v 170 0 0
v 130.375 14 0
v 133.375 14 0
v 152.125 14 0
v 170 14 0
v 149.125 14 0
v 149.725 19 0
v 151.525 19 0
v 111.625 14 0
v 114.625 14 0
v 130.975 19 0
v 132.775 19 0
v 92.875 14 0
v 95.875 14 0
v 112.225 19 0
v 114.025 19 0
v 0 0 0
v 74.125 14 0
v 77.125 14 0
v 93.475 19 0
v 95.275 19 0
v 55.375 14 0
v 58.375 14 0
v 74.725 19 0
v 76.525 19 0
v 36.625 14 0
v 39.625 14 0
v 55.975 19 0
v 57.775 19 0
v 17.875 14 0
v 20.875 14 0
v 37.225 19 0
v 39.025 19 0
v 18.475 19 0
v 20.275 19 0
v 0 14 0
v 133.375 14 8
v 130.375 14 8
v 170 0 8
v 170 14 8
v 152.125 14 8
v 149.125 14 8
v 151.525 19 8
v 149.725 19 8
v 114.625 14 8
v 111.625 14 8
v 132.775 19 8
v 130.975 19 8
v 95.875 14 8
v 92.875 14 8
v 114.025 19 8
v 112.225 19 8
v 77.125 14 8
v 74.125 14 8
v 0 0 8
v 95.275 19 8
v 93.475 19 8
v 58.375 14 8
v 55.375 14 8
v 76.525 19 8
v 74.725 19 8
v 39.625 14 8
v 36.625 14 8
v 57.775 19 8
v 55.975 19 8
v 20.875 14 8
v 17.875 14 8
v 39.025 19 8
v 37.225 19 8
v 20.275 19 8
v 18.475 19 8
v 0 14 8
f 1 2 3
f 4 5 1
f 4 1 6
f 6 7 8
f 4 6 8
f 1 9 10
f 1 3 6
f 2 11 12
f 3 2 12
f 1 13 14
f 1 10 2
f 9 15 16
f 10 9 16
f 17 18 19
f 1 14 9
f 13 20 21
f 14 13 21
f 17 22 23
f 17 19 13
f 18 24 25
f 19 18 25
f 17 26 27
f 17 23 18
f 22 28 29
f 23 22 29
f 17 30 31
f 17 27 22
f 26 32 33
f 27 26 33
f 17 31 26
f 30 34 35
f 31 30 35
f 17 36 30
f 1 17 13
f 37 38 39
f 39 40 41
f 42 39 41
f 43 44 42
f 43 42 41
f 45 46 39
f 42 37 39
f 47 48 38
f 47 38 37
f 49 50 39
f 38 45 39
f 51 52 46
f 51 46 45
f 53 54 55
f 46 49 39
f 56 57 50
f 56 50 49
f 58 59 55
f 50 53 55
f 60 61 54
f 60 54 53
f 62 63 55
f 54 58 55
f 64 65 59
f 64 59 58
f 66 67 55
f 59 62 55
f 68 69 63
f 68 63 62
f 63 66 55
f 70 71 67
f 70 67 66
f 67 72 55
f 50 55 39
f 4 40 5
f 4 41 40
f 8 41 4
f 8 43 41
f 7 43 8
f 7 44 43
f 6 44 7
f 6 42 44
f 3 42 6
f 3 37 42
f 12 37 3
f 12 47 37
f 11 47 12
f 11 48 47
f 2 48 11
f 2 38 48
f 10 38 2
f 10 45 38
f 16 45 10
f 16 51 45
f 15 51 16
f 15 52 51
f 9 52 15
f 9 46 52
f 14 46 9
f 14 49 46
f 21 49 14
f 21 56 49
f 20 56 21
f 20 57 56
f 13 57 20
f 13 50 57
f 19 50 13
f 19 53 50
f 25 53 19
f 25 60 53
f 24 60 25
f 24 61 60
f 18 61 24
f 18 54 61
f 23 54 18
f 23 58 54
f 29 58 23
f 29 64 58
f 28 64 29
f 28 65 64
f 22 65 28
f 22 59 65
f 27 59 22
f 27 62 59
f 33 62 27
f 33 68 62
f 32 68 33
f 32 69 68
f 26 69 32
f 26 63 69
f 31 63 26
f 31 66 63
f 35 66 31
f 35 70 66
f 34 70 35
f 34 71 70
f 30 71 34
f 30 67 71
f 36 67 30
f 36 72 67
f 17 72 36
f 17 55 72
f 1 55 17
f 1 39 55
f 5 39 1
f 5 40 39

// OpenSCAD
$fn = 32;

// ----------------------------------------------------------------------
// Gear rack: 8 teeth on a 170 mm bar, pitch 18.75 mm
// ----------------------------------------------------------------------

// --- parameters (mm) ---
profile_height = 8;       // extrusion height
profile_points = 36;      // points of the closed outline

profile = [[0, 0], [170, 0], [170, 14], [152.125, 14], [151.525, 19], [149.725, 19], [149.125, 14], [133.375, 14], [132.775, 19], [130.975, 19], [130.375, 14], [114.625, 14], [114.025, 19], [112.225, 19], [111.625, 14], [95.875, 14], [95.275, 19], [93.475, 19], [92.875, 14], [77.125, 14], [76.525, 19], [74.725, 19], [74.125, 14], [58.375, 14], [57.775, 19], [55.975, 19], [55.375, 14], [39.625, 14], [39.025, 19], [37.225, 19], [36.625, 14], [20.875, 14], [20.275, 19], [18.475, 19], [17.875, 14], [0, 14]];  // single closed polygon, 36 points, counter clockwise

// --- the one profile operation ---
linear_extrude(height = profile_height) polygon(points = profile);
